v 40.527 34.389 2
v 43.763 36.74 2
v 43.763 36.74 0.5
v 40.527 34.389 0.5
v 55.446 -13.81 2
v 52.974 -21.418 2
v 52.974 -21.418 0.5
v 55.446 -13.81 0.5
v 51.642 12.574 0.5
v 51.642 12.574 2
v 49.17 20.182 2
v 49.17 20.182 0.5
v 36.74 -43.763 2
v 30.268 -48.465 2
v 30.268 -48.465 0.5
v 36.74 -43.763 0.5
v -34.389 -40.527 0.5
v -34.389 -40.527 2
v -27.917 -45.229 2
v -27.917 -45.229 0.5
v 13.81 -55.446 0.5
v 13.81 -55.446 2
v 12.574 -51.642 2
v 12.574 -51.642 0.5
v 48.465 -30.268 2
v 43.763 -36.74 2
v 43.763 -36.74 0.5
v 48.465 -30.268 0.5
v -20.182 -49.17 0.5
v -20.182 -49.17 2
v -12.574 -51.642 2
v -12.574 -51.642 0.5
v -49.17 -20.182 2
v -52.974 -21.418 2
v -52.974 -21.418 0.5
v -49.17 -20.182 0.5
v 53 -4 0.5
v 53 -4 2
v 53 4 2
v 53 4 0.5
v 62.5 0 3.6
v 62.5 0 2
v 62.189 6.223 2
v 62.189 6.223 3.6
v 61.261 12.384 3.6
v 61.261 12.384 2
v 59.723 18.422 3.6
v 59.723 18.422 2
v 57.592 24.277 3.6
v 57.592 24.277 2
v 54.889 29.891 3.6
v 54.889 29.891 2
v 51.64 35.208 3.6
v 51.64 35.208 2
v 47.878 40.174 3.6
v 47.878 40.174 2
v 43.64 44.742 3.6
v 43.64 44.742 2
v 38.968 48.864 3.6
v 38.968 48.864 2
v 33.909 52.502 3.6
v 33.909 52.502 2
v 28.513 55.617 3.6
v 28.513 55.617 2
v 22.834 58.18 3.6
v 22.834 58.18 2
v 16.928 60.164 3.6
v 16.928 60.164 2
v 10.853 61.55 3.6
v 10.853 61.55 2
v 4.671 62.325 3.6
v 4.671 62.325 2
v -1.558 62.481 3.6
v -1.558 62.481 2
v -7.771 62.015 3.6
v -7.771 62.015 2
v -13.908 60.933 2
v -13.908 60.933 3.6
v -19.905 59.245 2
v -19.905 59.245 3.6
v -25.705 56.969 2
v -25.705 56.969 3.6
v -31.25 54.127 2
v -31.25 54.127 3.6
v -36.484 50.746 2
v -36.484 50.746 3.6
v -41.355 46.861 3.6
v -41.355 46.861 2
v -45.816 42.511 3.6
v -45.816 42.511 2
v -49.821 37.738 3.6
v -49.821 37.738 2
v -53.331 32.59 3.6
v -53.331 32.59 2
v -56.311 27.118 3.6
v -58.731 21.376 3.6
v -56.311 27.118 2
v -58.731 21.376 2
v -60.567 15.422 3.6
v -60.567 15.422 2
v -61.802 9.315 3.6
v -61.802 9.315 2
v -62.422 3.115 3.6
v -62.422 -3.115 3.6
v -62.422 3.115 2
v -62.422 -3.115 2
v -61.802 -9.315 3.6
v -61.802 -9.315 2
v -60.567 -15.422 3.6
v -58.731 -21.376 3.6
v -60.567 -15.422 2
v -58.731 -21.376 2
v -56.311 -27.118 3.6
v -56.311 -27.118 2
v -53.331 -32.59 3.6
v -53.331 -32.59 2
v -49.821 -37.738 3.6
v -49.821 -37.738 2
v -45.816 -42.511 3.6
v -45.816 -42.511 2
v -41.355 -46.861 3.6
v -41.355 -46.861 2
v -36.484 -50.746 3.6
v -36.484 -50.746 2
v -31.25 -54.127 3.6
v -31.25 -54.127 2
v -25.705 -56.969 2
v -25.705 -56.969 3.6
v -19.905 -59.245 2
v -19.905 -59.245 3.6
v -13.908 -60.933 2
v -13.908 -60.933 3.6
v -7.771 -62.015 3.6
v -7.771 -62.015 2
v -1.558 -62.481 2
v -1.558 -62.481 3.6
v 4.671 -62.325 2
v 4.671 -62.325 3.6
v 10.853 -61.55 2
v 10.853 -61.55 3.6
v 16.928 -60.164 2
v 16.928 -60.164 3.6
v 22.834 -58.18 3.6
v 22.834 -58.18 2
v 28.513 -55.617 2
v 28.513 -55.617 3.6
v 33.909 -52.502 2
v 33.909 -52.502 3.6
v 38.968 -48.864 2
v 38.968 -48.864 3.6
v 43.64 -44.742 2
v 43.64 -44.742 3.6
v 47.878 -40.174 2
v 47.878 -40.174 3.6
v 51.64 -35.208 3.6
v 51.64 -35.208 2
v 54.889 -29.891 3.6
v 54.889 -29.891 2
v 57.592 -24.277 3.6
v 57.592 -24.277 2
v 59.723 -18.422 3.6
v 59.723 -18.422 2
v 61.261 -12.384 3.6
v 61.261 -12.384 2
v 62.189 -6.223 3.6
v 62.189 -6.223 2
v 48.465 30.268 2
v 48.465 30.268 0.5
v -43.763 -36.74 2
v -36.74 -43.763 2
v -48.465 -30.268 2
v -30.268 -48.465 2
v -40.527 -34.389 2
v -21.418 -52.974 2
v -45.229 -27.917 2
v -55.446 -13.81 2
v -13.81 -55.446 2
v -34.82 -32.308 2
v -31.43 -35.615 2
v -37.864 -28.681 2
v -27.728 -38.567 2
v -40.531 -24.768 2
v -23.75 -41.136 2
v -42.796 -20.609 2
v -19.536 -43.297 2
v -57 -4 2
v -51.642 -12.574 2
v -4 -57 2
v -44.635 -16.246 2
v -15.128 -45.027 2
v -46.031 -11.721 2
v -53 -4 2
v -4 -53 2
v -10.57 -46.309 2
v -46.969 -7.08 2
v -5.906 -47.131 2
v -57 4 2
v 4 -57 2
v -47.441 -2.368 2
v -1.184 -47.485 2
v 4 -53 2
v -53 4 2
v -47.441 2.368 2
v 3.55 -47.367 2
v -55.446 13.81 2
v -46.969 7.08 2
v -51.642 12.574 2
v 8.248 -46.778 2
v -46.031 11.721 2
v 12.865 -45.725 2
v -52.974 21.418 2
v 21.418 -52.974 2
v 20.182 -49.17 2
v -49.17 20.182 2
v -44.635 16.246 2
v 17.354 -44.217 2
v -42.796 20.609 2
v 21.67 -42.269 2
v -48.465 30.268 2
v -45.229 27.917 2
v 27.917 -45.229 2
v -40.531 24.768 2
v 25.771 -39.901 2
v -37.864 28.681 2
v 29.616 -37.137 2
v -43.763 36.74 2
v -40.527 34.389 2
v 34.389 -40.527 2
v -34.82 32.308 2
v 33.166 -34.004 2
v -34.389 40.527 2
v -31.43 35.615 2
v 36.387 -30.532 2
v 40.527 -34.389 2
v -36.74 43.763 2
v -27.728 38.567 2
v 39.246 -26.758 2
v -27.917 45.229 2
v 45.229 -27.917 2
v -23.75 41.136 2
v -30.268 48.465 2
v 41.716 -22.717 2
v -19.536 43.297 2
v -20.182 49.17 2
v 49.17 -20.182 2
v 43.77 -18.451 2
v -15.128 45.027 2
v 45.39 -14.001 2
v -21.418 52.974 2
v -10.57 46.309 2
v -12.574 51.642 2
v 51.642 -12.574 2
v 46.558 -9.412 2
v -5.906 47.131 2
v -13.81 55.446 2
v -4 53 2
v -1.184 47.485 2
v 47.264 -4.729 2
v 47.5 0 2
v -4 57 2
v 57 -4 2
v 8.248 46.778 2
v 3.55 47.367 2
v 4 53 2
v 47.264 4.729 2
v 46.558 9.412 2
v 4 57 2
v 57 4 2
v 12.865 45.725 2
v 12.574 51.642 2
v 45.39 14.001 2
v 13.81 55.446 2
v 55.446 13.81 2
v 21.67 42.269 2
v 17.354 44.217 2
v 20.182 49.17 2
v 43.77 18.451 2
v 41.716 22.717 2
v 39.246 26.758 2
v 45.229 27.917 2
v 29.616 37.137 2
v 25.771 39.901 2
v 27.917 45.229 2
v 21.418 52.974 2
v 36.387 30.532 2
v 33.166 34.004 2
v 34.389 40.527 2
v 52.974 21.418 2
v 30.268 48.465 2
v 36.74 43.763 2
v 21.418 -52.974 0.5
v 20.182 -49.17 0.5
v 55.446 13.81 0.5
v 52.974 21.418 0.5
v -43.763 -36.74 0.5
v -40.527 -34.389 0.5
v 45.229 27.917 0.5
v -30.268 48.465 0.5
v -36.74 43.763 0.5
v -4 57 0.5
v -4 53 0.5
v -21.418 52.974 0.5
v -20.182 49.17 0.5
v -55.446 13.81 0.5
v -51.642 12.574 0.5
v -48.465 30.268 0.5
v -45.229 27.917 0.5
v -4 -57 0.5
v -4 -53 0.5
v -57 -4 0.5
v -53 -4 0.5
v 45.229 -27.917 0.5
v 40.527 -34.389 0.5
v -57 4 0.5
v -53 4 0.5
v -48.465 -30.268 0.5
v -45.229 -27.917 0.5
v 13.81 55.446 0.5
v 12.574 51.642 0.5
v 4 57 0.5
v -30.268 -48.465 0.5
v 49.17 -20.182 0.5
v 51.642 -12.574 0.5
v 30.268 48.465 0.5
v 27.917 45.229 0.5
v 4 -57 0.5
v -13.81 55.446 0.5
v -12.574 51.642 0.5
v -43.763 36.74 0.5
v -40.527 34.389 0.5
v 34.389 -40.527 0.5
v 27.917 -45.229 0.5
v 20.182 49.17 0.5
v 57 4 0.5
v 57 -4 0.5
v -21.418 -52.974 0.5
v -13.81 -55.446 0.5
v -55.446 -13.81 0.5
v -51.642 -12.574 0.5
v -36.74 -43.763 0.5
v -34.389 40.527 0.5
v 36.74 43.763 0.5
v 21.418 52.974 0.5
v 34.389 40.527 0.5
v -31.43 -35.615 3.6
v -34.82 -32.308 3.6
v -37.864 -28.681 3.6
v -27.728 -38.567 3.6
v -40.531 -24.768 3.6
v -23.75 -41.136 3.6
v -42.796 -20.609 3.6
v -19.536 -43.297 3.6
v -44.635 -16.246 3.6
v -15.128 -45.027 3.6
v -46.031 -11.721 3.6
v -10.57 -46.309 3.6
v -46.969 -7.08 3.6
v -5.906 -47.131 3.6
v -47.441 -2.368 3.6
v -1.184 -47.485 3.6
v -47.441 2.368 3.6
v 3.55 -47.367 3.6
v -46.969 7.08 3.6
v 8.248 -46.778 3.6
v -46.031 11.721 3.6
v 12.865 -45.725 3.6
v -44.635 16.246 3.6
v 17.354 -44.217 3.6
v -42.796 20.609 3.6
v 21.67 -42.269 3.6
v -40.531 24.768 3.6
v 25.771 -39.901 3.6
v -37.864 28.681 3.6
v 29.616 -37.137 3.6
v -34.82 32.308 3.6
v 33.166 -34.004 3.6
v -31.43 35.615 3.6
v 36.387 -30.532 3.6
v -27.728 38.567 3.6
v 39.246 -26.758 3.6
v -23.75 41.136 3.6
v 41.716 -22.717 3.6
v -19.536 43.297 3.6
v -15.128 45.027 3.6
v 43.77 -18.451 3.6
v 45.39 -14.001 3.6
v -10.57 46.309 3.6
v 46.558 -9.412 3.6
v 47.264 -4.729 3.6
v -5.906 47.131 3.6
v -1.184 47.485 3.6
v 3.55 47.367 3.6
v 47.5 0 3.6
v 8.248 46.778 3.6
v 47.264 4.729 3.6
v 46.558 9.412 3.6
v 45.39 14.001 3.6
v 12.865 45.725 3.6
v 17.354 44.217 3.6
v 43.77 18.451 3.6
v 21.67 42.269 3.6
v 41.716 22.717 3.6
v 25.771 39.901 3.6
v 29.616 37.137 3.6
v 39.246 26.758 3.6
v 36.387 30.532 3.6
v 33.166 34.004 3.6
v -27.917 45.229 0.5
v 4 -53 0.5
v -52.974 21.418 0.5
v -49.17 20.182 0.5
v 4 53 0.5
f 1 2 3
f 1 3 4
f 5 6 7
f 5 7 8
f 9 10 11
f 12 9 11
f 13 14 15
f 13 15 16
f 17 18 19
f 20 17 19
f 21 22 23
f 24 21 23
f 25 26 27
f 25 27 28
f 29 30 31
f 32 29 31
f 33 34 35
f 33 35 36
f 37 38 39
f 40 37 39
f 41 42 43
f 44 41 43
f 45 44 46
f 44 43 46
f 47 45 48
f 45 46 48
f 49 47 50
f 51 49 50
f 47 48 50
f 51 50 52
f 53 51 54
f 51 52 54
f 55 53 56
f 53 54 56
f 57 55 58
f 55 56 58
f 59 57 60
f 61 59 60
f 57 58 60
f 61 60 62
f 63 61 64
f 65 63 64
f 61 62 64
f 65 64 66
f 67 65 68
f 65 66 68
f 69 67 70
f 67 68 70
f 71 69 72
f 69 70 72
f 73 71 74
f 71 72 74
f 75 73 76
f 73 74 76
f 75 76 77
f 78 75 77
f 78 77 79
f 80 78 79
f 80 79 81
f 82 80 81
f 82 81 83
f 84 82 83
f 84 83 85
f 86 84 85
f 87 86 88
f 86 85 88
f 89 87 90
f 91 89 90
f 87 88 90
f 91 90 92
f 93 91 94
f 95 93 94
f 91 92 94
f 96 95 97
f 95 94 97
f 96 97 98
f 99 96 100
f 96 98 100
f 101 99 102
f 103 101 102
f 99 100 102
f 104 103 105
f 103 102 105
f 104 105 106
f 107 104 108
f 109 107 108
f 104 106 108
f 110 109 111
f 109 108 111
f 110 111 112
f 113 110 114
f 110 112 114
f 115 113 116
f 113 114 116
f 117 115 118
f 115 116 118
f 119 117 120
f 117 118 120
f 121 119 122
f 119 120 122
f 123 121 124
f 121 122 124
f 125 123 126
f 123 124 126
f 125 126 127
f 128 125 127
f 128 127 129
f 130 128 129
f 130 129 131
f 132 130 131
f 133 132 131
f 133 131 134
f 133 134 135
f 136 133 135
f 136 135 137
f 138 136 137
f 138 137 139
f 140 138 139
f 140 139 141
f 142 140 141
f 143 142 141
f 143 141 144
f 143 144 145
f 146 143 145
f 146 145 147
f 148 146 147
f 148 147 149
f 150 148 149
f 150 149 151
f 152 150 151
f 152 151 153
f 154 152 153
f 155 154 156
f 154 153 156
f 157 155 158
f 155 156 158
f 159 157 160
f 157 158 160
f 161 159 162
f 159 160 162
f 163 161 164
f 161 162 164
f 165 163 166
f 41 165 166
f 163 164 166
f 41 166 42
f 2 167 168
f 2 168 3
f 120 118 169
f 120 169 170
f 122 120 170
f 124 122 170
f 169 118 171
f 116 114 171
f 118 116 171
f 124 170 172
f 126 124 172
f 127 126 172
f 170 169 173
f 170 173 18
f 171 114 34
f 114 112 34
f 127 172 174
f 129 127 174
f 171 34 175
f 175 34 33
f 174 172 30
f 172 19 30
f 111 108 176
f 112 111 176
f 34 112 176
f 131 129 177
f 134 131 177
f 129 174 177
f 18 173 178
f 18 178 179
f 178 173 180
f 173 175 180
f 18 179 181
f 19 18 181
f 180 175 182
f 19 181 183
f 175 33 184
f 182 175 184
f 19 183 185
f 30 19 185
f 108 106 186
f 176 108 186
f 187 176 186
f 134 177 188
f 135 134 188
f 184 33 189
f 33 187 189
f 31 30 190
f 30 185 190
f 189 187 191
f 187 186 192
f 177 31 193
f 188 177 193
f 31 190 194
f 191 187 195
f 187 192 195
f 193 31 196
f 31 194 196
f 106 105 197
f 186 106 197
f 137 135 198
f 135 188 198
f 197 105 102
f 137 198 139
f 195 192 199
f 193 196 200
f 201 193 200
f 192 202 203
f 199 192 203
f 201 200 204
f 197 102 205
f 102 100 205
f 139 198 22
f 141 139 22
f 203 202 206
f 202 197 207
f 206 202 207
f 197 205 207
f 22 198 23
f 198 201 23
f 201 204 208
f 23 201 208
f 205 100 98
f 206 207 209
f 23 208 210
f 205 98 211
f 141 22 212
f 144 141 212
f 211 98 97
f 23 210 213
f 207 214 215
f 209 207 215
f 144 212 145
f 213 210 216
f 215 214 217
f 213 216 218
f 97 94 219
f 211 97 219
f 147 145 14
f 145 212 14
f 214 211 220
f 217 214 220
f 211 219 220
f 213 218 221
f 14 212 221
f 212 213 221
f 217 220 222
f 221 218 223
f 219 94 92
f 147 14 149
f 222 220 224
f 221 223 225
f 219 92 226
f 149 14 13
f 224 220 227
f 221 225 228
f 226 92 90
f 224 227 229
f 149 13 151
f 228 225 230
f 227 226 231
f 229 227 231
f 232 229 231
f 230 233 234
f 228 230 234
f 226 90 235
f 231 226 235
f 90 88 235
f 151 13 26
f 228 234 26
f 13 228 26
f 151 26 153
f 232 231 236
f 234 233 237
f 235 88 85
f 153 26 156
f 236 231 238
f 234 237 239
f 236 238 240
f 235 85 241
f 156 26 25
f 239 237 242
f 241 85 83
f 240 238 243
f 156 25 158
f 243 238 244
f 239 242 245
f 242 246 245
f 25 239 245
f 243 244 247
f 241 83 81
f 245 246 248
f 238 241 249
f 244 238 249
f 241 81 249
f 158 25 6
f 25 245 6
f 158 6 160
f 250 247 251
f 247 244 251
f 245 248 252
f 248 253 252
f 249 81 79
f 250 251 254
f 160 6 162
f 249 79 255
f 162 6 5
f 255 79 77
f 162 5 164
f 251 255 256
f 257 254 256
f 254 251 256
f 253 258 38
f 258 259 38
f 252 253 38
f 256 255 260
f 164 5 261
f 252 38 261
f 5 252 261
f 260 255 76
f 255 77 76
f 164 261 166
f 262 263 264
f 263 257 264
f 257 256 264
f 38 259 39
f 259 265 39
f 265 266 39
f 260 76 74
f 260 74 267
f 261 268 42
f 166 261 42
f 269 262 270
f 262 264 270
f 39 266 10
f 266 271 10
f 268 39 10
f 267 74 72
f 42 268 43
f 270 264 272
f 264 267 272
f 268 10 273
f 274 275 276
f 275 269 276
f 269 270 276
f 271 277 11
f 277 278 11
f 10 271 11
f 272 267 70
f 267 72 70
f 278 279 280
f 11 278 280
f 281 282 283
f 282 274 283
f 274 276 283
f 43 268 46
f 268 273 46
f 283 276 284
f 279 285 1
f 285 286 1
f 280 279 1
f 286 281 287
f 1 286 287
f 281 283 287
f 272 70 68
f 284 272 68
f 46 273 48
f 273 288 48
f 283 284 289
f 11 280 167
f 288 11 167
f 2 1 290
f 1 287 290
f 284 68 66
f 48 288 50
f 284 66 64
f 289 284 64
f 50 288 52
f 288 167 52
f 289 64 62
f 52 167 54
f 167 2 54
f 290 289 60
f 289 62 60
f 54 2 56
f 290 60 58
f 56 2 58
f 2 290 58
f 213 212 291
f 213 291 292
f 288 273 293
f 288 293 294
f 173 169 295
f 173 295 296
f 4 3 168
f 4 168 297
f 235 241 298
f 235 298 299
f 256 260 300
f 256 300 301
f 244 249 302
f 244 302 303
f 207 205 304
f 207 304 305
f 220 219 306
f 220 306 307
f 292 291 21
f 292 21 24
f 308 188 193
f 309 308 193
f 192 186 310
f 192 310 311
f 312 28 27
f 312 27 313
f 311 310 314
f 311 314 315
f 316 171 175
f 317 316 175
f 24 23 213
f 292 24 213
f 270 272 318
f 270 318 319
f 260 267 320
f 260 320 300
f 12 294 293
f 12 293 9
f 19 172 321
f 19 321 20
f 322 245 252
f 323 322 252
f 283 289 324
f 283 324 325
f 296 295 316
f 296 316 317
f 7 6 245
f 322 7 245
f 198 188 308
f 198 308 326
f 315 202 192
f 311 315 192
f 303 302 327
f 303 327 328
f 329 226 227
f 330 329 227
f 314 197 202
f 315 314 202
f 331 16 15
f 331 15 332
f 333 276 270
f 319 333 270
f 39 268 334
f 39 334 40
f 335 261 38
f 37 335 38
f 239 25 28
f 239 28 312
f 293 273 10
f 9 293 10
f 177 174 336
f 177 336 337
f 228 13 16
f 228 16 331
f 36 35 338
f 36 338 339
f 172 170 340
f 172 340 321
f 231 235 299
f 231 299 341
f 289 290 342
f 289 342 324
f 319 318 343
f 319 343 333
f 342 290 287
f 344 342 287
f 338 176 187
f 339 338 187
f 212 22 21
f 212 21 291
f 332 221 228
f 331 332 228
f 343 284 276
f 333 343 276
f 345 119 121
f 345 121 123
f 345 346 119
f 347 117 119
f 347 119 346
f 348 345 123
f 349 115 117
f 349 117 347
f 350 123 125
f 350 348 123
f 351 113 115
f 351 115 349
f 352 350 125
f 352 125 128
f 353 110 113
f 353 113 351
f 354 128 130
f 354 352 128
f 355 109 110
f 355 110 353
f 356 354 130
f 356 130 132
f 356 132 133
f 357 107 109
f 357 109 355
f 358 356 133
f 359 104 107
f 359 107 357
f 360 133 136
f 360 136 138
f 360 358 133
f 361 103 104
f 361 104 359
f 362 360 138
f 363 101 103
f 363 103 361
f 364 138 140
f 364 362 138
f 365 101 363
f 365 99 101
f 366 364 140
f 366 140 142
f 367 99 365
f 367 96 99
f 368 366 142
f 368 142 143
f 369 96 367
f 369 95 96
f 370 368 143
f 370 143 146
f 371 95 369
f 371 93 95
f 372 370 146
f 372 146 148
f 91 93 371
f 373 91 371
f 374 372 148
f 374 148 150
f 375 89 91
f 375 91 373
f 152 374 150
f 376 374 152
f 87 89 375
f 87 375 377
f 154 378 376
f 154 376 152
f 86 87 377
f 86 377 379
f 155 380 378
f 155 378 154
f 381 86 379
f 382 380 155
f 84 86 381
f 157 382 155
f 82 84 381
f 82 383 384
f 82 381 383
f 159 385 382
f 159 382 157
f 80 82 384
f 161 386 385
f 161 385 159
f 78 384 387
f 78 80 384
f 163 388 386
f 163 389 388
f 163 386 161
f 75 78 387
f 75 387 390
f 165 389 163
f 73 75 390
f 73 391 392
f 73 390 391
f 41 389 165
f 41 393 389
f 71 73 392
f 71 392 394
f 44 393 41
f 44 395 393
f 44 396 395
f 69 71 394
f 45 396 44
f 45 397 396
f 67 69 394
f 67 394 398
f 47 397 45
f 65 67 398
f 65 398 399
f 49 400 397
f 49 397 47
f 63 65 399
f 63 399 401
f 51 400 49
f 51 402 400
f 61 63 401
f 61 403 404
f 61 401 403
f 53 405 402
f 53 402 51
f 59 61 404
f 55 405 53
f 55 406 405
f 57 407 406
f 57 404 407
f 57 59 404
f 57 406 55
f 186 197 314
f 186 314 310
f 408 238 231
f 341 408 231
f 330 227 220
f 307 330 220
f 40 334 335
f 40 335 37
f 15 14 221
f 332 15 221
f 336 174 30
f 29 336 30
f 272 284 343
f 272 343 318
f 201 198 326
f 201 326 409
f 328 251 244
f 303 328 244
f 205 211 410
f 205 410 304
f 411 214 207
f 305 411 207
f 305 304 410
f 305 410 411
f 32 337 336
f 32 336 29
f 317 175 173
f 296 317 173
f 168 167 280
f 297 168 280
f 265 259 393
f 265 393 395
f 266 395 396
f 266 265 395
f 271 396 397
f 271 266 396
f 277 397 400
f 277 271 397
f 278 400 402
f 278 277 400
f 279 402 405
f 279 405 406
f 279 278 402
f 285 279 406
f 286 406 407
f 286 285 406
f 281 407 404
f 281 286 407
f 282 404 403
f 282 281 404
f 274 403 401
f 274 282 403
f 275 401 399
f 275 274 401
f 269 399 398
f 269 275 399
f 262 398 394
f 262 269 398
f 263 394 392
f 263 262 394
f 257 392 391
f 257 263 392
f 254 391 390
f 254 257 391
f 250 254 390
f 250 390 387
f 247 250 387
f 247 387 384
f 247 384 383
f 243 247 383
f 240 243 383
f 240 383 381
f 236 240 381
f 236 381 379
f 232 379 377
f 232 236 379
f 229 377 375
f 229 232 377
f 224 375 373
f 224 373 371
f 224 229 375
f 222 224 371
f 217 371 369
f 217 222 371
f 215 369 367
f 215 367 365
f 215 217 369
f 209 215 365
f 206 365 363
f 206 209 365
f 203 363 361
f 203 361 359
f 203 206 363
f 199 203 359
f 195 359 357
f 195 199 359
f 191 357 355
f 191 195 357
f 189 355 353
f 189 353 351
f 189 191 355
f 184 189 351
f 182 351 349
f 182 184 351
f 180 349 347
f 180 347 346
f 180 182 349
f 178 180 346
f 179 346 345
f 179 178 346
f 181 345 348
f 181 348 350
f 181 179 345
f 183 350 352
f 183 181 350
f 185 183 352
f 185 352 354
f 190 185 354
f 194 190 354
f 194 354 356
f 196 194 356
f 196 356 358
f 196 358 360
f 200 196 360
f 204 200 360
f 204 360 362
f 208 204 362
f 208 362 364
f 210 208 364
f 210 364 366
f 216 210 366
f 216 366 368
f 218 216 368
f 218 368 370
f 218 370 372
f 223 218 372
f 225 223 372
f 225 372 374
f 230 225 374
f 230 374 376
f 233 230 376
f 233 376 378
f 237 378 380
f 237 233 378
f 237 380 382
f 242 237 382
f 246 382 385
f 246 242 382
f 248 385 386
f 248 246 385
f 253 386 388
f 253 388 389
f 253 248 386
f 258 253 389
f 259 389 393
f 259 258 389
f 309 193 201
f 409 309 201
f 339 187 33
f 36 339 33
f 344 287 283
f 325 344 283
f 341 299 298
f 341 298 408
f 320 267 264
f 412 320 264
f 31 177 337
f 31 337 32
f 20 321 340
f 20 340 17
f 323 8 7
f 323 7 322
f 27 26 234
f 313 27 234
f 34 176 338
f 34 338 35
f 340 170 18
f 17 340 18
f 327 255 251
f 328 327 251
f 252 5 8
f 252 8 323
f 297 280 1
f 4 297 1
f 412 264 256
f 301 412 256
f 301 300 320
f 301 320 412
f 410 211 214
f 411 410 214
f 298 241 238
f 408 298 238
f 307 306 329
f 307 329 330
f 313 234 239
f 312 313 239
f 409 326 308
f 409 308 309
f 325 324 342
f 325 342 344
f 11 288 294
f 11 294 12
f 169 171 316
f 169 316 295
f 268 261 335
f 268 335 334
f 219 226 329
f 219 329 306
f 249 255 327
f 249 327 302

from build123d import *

# Parameters (mm, degrees)
SKETCH079_R           = 62.5
SKETCH079_R_2         = 47.5
PAD055_DEPTH          = 1.6
SKETCH080_W           = 4
SKETCH080_H           = 8
PAD056_DEPTH          = 1.5
POLARPATTERN011_COUNT = 20


with BuildPart() as part:
    # Sketch079 → Pad055 (new body)
    with BuildSketch(Plane.XY):
        Circle(SKETCH079_R)
        Circle(SKETCH079_R_2, mode=Mode.SUBTRACT)
    extrude(amount=PAD055_DEPTH)

    # Sketch080 (on Face3 of Pad055) → Pad056 (join)
    with BuildSketch(Plane(origin=(0, 0, 0), x_dir=(1, 0, 0), z_dir=(0, 0, -1))):
        with Locations((-55, 0)):
            Rectangle(SKETCH080_W, SKETCH080_H)
    pad056 = extrude(amount=PAD056_DEPTH)

    # PolarPattern011: Pad056 ×20 about axis
    polarpattern011_axis = Axis((0, 0, 0), (0, 0, -1))
    for i in range(1, POLARPATTERN011_COUNT):
        add(pad056.rotate(polarpattern011_axis, i * 360 / POLARPATTERN011_COUNT))


with BuildPart() as part_1:
    # Body032 placement: moved
    add(part.part.moved(Location((0, 0, 2))))


solid = part_1.part
